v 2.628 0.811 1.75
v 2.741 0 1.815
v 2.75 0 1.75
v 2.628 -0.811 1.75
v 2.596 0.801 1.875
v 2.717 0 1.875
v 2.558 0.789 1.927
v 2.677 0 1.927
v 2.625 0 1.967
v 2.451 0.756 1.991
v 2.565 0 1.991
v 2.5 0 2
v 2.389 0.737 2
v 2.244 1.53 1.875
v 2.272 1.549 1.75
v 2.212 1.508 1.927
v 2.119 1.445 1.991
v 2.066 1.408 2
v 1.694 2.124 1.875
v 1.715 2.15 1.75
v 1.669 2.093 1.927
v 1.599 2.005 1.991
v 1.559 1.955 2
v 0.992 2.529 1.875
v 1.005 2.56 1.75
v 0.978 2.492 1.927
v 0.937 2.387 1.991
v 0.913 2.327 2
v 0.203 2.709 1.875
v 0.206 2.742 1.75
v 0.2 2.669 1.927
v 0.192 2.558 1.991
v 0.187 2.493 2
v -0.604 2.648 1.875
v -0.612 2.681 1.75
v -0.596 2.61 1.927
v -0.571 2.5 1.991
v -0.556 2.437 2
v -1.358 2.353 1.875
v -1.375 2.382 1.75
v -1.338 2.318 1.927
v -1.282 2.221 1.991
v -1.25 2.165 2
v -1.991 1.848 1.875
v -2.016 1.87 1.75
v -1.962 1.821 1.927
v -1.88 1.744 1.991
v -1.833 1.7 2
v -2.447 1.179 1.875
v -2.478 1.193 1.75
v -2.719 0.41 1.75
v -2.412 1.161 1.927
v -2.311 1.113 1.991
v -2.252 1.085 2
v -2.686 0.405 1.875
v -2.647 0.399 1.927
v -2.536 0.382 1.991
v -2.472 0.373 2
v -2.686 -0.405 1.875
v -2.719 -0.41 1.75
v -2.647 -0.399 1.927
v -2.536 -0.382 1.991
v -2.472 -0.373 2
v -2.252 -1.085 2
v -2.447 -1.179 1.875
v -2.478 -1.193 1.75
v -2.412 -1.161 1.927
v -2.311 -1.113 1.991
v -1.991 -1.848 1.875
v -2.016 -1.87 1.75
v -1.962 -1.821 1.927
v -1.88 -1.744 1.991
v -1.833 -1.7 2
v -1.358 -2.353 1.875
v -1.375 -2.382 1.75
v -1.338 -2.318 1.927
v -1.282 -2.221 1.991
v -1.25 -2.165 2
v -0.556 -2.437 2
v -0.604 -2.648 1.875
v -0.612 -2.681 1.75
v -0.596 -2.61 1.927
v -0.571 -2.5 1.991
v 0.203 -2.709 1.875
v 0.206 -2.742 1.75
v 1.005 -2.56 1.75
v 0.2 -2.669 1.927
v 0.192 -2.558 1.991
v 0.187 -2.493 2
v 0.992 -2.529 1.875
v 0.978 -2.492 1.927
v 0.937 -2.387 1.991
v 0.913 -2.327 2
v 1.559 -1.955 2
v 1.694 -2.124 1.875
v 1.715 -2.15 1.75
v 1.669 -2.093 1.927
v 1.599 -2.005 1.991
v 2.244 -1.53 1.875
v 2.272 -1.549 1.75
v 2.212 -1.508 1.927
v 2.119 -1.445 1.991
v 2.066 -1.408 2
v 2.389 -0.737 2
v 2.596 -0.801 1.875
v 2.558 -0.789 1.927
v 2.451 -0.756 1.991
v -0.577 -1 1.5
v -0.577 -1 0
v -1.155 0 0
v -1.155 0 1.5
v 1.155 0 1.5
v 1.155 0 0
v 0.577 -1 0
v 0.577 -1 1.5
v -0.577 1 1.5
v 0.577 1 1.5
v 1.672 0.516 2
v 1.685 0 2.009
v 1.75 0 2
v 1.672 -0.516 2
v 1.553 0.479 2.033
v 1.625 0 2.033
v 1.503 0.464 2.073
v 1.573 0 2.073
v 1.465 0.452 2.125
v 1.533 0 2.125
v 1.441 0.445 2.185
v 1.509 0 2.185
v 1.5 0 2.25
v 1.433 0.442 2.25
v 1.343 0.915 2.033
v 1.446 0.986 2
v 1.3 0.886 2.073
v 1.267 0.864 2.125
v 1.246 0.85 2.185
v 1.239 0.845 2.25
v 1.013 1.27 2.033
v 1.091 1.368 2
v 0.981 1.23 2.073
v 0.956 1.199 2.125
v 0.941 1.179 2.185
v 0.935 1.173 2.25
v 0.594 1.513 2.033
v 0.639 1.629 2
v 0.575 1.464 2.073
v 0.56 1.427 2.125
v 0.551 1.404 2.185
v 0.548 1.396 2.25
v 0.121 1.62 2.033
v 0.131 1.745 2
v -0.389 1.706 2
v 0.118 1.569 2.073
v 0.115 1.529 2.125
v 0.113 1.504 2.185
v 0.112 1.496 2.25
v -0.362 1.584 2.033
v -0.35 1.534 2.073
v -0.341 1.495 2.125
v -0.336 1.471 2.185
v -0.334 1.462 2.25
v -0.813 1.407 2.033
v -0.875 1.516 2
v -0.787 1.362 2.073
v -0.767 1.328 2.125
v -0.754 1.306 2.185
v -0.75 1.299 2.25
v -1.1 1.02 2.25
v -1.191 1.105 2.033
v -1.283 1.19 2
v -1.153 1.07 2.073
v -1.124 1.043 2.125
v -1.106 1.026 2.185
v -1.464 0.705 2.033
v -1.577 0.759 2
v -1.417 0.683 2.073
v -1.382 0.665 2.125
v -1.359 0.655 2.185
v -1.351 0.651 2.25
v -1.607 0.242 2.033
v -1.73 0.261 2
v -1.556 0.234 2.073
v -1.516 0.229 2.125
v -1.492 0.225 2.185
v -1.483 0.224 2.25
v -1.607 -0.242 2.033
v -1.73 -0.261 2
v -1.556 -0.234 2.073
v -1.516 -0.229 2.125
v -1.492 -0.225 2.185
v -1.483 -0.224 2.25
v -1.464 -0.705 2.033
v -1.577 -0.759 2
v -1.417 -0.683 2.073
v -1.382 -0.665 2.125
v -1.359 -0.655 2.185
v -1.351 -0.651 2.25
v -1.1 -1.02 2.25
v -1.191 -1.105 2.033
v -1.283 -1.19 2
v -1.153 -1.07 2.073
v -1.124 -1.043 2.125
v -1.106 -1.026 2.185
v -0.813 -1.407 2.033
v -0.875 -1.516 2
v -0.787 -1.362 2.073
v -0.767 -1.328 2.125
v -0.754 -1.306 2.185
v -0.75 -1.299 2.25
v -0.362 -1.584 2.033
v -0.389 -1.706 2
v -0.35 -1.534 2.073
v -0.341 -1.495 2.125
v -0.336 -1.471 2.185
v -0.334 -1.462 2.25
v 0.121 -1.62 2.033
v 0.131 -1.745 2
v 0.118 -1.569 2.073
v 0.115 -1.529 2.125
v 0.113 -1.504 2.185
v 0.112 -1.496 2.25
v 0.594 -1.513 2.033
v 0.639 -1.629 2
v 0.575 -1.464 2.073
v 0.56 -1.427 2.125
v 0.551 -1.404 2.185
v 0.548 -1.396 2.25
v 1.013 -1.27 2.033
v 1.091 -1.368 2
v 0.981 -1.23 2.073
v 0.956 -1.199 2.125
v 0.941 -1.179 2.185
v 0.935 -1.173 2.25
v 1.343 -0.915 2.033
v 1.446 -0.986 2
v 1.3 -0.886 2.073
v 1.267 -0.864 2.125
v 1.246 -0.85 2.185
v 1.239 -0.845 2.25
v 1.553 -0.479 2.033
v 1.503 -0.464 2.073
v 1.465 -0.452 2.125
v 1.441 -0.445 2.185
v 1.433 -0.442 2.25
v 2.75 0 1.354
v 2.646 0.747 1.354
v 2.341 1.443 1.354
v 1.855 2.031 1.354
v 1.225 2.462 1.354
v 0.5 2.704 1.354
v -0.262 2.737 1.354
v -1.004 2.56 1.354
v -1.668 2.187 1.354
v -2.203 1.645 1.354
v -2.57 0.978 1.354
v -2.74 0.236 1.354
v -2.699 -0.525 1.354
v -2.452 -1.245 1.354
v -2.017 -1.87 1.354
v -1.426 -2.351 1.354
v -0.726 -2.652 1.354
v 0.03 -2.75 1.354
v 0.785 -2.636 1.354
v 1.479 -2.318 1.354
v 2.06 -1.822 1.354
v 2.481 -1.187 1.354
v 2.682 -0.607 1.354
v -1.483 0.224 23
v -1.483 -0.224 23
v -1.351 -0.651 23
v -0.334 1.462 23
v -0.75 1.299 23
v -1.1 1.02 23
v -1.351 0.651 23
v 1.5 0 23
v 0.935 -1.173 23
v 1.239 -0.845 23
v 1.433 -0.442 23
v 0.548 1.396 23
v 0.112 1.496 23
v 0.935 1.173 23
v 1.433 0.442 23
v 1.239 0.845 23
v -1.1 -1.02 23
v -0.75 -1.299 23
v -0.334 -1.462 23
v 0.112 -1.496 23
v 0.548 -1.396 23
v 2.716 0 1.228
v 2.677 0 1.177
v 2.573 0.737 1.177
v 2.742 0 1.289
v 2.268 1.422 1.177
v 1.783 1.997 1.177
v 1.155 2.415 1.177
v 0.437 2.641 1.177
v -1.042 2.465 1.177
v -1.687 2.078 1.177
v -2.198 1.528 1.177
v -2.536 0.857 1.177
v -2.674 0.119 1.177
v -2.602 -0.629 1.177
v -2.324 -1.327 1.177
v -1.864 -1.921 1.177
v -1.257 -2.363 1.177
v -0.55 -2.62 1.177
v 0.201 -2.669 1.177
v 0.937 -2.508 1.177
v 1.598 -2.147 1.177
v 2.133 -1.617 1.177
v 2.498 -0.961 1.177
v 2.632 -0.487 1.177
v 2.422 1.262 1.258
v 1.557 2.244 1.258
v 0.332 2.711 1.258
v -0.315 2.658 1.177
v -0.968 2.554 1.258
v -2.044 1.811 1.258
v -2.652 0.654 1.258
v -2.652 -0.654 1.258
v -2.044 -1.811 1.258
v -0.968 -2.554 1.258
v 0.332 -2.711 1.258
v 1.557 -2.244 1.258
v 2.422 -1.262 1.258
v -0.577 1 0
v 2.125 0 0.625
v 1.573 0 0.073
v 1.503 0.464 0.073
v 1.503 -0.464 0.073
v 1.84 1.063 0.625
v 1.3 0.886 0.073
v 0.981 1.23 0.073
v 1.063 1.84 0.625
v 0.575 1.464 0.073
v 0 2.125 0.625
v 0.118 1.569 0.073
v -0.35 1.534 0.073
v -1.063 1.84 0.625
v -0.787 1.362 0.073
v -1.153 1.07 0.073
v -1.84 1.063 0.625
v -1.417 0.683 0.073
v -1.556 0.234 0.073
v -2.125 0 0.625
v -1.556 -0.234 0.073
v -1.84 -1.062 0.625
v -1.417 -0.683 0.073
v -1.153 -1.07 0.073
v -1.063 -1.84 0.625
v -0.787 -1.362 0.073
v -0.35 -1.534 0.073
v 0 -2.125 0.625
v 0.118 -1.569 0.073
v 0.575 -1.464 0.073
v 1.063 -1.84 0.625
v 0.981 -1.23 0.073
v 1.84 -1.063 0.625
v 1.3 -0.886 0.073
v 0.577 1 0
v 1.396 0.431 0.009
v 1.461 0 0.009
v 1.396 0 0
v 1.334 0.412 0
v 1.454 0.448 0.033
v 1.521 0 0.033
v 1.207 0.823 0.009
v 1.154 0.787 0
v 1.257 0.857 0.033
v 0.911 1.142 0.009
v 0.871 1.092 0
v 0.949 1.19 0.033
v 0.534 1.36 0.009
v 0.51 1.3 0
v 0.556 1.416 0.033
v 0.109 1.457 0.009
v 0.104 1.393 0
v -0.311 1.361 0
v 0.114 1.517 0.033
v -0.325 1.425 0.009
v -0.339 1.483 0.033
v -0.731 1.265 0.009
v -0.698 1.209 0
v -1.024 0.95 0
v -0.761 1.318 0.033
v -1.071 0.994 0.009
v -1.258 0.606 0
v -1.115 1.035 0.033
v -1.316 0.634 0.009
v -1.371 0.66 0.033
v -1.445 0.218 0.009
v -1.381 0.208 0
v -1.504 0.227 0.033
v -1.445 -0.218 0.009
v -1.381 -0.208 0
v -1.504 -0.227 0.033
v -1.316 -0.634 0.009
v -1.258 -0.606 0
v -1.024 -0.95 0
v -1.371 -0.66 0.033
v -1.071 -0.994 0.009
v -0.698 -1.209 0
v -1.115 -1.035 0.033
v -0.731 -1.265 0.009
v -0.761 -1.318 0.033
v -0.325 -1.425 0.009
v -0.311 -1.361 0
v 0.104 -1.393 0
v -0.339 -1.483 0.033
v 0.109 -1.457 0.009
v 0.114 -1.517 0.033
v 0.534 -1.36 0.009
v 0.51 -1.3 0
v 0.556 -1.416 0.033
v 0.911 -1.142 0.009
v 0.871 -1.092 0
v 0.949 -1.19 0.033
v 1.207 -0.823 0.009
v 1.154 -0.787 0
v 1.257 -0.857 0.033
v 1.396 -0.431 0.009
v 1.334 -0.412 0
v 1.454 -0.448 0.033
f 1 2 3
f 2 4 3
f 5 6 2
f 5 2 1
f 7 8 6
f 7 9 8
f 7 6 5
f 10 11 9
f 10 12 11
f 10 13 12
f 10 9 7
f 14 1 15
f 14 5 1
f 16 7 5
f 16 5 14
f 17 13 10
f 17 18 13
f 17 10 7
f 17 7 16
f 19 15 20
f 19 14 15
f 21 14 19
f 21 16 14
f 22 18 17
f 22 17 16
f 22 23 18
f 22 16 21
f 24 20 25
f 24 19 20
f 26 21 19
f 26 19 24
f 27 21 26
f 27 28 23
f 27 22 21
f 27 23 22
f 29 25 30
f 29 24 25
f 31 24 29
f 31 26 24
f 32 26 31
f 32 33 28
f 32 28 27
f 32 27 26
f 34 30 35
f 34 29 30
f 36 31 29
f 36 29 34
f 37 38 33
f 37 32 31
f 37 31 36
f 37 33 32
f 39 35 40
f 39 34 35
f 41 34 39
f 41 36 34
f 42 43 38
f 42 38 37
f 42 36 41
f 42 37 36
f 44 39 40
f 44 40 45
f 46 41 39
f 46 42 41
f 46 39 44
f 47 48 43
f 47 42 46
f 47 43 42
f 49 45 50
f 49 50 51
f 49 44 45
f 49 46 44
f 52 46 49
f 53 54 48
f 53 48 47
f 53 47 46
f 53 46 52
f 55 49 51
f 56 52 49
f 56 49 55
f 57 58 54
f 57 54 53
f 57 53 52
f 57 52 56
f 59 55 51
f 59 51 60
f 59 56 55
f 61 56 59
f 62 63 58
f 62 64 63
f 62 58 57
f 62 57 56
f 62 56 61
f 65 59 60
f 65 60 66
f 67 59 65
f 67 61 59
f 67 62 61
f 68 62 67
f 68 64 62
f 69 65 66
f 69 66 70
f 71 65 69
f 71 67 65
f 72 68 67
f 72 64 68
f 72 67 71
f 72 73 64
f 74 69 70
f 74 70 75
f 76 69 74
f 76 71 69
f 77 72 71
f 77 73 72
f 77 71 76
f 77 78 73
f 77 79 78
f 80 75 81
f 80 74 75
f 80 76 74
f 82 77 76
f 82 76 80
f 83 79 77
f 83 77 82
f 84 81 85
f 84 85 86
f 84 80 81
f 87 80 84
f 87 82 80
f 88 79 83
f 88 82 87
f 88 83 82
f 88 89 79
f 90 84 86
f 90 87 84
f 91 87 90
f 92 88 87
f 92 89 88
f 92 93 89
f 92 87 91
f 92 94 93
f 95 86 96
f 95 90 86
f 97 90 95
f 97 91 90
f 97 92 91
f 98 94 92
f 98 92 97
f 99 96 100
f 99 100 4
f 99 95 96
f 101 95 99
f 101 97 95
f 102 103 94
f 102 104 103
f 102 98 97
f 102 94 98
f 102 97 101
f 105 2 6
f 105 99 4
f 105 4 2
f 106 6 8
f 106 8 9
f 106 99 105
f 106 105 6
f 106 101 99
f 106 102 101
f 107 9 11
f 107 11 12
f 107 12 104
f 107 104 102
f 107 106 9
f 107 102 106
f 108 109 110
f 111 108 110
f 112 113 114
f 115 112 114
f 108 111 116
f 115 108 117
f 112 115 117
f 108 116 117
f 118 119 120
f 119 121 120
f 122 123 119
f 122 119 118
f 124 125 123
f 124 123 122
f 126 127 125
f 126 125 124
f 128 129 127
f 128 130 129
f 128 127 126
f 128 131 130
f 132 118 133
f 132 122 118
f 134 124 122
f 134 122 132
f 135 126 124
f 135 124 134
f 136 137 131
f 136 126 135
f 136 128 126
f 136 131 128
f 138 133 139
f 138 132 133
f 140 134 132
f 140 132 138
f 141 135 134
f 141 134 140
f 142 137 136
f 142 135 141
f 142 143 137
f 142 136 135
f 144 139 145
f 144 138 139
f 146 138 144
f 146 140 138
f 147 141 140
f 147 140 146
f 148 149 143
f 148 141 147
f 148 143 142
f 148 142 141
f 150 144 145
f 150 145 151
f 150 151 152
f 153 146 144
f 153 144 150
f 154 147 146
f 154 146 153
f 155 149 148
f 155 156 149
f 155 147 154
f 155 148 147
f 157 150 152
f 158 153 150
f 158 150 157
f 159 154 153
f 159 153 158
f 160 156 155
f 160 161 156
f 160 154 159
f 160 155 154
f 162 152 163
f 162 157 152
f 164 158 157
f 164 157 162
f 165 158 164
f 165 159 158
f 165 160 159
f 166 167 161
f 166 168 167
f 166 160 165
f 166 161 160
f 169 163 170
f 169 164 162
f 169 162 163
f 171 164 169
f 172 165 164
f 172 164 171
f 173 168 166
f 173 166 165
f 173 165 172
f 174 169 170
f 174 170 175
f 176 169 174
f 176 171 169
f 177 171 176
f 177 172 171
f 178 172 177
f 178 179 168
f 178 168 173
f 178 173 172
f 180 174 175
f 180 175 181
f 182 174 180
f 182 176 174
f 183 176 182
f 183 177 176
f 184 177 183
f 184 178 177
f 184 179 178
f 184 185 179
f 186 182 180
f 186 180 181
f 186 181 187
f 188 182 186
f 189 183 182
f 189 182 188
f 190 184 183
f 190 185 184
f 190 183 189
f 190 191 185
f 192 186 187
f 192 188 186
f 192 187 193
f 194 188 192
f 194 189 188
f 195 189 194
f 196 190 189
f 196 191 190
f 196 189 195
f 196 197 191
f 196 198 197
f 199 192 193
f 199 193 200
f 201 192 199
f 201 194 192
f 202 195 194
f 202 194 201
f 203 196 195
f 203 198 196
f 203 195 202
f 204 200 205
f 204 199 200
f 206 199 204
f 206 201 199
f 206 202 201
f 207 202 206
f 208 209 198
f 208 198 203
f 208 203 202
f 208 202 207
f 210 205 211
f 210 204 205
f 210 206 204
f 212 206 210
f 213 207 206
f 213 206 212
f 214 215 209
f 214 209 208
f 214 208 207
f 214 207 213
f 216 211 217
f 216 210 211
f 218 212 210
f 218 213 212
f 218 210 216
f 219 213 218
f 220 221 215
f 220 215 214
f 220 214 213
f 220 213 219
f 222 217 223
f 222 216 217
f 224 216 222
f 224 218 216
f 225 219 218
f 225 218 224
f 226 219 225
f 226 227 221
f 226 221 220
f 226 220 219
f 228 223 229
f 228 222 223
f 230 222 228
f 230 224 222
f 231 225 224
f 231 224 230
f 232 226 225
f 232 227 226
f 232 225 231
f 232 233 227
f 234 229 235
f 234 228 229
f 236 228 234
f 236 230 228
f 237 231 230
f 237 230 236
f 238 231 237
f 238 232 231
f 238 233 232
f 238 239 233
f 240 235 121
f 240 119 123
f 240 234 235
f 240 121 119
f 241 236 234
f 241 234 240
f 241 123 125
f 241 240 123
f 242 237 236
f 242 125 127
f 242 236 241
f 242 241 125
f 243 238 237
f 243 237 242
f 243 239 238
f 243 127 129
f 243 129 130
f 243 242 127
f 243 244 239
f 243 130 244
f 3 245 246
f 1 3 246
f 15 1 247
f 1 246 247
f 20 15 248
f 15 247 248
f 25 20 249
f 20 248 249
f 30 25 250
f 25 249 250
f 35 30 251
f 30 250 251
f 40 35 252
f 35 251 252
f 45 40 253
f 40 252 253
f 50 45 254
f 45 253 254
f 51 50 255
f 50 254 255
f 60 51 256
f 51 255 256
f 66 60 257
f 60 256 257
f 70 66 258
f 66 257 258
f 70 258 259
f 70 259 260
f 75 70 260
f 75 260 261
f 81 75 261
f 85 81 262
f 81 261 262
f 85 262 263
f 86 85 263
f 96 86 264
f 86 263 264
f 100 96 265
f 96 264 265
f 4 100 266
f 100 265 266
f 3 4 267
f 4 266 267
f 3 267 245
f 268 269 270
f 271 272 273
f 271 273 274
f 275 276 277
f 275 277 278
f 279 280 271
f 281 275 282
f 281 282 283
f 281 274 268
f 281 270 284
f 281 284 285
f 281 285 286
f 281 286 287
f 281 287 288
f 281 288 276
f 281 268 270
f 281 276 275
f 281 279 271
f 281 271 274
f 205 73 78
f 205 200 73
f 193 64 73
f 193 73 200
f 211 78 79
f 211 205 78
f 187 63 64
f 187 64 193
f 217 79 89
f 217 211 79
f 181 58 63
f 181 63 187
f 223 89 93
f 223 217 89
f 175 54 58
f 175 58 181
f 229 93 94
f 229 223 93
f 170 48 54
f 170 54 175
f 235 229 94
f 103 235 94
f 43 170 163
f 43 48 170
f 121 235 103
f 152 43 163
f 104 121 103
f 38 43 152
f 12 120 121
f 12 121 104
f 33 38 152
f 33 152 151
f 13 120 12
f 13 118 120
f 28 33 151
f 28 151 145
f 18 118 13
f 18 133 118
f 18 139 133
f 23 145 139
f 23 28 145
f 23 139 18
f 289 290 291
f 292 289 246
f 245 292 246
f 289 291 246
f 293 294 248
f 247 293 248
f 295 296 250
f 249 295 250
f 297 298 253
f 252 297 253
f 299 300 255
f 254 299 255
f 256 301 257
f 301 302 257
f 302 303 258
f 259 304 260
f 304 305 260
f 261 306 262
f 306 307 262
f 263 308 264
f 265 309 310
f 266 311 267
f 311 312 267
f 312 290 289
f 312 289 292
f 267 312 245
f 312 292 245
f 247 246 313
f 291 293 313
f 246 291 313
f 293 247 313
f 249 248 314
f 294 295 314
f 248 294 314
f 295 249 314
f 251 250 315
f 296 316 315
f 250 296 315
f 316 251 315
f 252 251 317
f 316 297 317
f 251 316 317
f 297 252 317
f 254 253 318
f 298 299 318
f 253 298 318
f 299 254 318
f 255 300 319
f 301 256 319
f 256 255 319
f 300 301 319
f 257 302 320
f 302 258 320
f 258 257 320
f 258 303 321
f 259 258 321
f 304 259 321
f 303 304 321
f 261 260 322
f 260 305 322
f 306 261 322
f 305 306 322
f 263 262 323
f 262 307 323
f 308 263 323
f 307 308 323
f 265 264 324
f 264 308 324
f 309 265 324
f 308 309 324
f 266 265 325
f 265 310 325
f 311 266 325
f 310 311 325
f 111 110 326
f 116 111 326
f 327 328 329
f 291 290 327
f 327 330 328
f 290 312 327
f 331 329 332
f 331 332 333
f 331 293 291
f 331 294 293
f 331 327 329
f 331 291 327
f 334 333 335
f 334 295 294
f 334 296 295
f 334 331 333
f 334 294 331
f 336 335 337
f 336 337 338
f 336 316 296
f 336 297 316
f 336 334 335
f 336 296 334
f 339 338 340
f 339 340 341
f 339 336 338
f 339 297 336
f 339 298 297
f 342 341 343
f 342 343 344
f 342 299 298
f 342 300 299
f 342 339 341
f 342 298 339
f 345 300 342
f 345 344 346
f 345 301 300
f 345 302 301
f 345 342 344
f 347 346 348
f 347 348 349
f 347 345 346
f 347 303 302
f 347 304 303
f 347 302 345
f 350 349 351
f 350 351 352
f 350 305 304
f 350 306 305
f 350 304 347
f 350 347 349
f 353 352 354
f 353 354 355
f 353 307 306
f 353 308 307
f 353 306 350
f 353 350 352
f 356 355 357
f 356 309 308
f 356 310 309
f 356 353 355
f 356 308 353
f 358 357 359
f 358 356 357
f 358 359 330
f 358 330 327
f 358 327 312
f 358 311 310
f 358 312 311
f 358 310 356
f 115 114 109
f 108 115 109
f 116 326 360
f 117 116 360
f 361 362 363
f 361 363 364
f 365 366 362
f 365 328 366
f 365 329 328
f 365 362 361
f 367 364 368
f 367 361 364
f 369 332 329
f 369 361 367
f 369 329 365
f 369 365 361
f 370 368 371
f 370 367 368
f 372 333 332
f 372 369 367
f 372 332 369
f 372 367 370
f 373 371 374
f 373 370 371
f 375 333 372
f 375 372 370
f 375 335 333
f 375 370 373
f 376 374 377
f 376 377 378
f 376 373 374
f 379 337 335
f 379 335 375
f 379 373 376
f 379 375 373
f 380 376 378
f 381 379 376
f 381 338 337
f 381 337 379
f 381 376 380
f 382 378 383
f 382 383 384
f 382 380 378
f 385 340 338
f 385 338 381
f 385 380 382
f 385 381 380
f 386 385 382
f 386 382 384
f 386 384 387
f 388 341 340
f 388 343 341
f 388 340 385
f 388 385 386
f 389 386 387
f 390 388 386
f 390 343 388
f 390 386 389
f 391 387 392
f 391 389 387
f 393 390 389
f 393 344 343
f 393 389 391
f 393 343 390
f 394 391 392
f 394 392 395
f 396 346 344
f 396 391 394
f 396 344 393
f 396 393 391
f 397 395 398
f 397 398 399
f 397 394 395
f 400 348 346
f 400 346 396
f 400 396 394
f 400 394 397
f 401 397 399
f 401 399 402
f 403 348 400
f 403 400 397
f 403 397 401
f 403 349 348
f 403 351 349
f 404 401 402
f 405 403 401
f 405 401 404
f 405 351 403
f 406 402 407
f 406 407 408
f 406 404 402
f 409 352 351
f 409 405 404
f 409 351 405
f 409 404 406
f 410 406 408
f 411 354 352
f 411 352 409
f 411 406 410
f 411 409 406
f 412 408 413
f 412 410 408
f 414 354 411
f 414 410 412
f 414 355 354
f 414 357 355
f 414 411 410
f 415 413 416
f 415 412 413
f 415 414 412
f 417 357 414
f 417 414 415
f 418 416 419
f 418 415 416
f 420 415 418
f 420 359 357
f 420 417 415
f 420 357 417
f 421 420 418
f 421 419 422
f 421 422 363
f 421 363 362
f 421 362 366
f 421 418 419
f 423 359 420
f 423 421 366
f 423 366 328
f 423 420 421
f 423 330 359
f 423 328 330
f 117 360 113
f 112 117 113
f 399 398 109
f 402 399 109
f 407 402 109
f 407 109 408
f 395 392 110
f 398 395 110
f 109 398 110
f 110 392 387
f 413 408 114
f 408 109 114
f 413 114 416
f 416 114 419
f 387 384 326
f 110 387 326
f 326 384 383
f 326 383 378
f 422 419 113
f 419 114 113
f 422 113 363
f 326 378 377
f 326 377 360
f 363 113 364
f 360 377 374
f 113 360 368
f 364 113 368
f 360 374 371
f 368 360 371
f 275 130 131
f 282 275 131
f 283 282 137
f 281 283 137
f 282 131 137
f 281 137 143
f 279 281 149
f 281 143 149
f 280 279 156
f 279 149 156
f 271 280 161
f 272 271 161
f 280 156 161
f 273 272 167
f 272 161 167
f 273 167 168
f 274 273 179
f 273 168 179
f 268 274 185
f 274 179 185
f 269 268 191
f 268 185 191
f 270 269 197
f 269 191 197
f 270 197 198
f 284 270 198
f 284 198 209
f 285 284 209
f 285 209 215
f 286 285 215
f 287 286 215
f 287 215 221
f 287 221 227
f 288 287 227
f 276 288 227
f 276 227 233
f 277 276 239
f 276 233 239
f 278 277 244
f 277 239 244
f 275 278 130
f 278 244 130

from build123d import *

# Parameters (mm, degrees)
F1_R     = 2.75
F1_R_2   = 1.5
F2_DEPTH = 2
F3_START = 1.5
F3_DEPTH = 0.5
F4_START = 2
F4_DEPTH = 21
F5_SIZE2 = 1.25
F5_SIZE  = 1.25
F6_R     = 0.25


# Not quite as in the source:
# - a feature names something its author has since deleted; it is built from what else it names


with BuildPart() as f2:
    # F1 (on Top) → F2 (new body)
    with BuildSketch(Plane.XY):
        Circle(F1_R)
        Circle(F1_R_2, mode=Mode.SUBTRACT)
        Circle(F1_R_2)
        Polygon((-0.5773502692, -1), (-1.1547005384, 0), (-0.5773502692, 1), (0.5773502692, 1), (1.1547005384, 0), (0.5773502692, -1), align=None, mode=Mode.SUBTRACT)
    extrude(amount=F2_DEPTH)

    # F1 (on Top) → F3 (join)
    with BuildSketch(Plane.XY.offset(F3_START)):
        Polygon((-0.5773502692, 1), (-1.1547005384, 0), (-0.5773502692, -1), (0.5773502692, -1), (1.1547005384, 0), (0.5773502692, 1), align=None)
    extrude(amount=F3_DEPTH)

    # F1 (on Top) → F4 (join)
    with BuildSketch(Plane.XY.offset(F4_START)):
        Circle(F1_R_2)
        Polygon((-0.5773502692, -1), (-1.1547005384, 0), (-0.5773502692, 1), (0.5773502692, 1), (1.1547005384, 0), (0.5773502692, -1), align=None, mode=Mode.SUBTRACT)
        Polygon((-0.5773502692, 1), (-1.1547005384, 0), (-0.5773502692, -1), (0.5773502692, -1), (1.1547005384, 0), (0.5773502692, 1), align=None)
    extrude(amount=F4_DEPTH)

    # F5
    f5_edges = [f2.edges().sort_by_distance(p)[0] for p in [
        (-2.75, 0, 0),
    ]]
    chamfer(f5_edges, length=F5_SIZE, length2=F5_SIZE2)

    # F6
    f6_edges = [f2.edges().sort_by_distance(p)[0] for p in [
        (-2.75, 0, 2),
        (-1.5, 0, 2),
        (-1.5, 0, 0),
        (-2.75, 0, 1.25),
    ]]
    fillet(f6_edges, radius=F6_R)


solid = f2.part
